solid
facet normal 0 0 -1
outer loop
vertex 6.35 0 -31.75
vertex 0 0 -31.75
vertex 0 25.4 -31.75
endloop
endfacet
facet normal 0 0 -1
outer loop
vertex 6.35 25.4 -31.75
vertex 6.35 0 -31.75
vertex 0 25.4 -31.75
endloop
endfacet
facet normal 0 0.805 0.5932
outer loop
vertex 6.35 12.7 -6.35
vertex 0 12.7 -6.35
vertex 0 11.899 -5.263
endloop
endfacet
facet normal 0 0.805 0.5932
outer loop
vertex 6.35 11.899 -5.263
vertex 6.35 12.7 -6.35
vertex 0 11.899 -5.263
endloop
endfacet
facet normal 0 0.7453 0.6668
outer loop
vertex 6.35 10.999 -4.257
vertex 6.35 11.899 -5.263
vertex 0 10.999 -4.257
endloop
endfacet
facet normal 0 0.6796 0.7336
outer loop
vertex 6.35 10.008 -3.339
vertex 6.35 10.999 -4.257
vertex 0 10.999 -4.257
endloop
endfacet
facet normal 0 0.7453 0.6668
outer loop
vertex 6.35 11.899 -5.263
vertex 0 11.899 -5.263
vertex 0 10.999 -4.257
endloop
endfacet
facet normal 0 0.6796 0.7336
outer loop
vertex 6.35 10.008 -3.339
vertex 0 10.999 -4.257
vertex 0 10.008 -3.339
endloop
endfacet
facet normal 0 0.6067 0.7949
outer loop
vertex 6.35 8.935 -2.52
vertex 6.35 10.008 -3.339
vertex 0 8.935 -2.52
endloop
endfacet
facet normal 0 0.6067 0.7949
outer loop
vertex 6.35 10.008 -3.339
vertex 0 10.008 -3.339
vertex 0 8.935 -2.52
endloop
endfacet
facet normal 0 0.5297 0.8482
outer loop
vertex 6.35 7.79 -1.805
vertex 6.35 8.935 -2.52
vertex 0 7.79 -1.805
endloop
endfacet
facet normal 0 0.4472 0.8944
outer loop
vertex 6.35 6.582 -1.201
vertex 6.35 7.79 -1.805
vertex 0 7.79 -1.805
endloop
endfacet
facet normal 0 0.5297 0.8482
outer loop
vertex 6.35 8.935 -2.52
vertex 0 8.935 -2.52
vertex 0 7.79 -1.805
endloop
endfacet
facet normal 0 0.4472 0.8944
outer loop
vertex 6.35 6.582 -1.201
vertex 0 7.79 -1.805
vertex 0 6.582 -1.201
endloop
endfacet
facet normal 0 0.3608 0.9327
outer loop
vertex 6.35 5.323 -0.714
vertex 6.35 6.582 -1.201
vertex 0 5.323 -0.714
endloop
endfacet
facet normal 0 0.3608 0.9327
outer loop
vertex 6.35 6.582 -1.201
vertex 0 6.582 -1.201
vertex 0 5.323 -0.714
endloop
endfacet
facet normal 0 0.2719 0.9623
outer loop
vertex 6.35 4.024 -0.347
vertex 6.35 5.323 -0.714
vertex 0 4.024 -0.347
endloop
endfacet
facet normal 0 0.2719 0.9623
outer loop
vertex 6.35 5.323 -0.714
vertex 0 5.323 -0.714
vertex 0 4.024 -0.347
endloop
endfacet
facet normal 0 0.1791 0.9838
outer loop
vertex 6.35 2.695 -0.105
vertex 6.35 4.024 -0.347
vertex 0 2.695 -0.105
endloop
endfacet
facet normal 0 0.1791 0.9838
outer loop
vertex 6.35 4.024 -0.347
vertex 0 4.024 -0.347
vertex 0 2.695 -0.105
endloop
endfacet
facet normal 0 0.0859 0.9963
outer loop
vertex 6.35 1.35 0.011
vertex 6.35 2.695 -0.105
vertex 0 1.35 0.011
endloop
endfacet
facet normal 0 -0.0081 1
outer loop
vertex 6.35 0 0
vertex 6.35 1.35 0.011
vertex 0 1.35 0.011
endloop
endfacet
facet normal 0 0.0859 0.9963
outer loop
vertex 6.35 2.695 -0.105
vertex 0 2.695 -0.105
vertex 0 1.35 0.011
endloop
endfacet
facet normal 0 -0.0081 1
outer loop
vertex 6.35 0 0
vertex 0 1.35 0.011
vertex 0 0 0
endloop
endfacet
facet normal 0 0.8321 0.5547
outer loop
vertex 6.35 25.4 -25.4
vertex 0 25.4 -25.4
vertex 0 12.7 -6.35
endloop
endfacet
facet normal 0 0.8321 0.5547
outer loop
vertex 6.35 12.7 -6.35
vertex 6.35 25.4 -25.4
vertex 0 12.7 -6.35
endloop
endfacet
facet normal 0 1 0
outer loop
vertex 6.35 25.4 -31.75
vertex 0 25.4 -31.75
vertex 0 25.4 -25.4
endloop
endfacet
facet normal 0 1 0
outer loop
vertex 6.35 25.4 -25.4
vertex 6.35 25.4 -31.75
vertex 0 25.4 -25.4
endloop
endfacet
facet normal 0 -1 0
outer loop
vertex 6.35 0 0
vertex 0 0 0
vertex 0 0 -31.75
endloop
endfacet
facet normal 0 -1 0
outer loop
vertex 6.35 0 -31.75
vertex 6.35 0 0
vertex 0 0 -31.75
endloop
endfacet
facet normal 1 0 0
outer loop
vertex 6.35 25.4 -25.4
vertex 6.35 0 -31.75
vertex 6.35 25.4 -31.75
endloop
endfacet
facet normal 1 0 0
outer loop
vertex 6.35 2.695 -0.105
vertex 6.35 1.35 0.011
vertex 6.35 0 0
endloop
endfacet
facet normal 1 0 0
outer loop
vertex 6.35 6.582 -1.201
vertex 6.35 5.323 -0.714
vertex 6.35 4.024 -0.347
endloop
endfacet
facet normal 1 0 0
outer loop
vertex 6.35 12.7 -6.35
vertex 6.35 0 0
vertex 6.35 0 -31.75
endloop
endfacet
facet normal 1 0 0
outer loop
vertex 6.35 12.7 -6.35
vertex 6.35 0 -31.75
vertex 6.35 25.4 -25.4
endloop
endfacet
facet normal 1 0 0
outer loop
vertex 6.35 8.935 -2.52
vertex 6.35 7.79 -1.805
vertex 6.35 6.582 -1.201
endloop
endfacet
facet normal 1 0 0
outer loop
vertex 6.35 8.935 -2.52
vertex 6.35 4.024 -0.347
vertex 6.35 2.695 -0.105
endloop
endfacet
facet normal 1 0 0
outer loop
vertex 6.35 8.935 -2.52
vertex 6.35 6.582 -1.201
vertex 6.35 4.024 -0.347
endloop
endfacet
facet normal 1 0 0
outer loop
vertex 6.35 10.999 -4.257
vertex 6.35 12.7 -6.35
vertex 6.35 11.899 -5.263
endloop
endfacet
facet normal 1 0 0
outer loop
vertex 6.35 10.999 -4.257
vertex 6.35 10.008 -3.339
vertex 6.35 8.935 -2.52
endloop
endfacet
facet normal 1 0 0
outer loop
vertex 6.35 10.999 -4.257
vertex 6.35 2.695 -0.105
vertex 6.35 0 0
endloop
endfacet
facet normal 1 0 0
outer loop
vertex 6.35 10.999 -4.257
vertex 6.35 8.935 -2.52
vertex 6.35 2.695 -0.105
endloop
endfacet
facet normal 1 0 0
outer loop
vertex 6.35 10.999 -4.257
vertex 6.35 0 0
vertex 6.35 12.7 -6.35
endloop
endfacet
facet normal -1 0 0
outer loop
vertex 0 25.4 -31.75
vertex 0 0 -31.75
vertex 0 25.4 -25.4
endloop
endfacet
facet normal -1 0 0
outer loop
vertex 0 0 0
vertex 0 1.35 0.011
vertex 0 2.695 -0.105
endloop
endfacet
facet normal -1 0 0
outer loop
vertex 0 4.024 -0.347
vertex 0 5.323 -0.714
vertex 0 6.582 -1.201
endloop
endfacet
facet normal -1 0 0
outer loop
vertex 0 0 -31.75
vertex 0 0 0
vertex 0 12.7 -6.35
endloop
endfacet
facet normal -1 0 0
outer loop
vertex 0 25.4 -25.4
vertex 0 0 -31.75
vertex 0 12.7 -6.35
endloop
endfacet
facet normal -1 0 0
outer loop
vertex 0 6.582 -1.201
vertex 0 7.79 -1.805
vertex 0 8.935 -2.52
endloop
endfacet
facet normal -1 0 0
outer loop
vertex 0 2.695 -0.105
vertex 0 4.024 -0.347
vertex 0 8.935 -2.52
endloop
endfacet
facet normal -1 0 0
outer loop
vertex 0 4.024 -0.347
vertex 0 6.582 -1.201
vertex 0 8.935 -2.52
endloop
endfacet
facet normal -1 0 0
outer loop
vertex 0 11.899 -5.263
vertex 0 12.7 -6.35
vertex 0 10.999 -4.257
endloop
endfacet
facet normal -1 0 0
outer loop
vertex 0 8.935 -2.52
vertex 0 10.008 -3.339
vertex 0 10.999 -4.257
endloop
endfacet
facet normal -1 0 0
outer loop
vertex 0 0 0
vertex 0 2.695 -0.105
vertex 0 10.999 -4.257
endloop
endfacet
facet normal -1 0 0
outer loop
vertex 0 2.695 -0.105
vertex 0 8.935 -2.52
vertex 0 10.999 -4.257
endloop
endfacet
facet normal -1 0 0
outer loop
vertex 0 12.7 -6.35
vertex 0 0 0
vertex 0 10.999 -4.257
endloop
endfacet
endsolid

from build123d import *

# Parameters (mm, degrees)
F1_DEPTH = 6.35


with BuildPart() as f1:
    # F0 (on Right) → F1 (new body)
    with BuildSketch(Plane.YZ):
        with BuildLine():
            ThreePointArc((12.7, -6.35), (7.193167, -1.488666), (0, 0))
            Line((0, 0), (0, -31.75))
            Line((0, -31.75), (25.4, -31.75))
            Line((25.4, -31.75), (25.4, -25.4))
            Line((25.4, -25.4), (12.7, -6.35))
        make_face()
    extrude(amount=F1_DEPTH)


solid = f1.part
